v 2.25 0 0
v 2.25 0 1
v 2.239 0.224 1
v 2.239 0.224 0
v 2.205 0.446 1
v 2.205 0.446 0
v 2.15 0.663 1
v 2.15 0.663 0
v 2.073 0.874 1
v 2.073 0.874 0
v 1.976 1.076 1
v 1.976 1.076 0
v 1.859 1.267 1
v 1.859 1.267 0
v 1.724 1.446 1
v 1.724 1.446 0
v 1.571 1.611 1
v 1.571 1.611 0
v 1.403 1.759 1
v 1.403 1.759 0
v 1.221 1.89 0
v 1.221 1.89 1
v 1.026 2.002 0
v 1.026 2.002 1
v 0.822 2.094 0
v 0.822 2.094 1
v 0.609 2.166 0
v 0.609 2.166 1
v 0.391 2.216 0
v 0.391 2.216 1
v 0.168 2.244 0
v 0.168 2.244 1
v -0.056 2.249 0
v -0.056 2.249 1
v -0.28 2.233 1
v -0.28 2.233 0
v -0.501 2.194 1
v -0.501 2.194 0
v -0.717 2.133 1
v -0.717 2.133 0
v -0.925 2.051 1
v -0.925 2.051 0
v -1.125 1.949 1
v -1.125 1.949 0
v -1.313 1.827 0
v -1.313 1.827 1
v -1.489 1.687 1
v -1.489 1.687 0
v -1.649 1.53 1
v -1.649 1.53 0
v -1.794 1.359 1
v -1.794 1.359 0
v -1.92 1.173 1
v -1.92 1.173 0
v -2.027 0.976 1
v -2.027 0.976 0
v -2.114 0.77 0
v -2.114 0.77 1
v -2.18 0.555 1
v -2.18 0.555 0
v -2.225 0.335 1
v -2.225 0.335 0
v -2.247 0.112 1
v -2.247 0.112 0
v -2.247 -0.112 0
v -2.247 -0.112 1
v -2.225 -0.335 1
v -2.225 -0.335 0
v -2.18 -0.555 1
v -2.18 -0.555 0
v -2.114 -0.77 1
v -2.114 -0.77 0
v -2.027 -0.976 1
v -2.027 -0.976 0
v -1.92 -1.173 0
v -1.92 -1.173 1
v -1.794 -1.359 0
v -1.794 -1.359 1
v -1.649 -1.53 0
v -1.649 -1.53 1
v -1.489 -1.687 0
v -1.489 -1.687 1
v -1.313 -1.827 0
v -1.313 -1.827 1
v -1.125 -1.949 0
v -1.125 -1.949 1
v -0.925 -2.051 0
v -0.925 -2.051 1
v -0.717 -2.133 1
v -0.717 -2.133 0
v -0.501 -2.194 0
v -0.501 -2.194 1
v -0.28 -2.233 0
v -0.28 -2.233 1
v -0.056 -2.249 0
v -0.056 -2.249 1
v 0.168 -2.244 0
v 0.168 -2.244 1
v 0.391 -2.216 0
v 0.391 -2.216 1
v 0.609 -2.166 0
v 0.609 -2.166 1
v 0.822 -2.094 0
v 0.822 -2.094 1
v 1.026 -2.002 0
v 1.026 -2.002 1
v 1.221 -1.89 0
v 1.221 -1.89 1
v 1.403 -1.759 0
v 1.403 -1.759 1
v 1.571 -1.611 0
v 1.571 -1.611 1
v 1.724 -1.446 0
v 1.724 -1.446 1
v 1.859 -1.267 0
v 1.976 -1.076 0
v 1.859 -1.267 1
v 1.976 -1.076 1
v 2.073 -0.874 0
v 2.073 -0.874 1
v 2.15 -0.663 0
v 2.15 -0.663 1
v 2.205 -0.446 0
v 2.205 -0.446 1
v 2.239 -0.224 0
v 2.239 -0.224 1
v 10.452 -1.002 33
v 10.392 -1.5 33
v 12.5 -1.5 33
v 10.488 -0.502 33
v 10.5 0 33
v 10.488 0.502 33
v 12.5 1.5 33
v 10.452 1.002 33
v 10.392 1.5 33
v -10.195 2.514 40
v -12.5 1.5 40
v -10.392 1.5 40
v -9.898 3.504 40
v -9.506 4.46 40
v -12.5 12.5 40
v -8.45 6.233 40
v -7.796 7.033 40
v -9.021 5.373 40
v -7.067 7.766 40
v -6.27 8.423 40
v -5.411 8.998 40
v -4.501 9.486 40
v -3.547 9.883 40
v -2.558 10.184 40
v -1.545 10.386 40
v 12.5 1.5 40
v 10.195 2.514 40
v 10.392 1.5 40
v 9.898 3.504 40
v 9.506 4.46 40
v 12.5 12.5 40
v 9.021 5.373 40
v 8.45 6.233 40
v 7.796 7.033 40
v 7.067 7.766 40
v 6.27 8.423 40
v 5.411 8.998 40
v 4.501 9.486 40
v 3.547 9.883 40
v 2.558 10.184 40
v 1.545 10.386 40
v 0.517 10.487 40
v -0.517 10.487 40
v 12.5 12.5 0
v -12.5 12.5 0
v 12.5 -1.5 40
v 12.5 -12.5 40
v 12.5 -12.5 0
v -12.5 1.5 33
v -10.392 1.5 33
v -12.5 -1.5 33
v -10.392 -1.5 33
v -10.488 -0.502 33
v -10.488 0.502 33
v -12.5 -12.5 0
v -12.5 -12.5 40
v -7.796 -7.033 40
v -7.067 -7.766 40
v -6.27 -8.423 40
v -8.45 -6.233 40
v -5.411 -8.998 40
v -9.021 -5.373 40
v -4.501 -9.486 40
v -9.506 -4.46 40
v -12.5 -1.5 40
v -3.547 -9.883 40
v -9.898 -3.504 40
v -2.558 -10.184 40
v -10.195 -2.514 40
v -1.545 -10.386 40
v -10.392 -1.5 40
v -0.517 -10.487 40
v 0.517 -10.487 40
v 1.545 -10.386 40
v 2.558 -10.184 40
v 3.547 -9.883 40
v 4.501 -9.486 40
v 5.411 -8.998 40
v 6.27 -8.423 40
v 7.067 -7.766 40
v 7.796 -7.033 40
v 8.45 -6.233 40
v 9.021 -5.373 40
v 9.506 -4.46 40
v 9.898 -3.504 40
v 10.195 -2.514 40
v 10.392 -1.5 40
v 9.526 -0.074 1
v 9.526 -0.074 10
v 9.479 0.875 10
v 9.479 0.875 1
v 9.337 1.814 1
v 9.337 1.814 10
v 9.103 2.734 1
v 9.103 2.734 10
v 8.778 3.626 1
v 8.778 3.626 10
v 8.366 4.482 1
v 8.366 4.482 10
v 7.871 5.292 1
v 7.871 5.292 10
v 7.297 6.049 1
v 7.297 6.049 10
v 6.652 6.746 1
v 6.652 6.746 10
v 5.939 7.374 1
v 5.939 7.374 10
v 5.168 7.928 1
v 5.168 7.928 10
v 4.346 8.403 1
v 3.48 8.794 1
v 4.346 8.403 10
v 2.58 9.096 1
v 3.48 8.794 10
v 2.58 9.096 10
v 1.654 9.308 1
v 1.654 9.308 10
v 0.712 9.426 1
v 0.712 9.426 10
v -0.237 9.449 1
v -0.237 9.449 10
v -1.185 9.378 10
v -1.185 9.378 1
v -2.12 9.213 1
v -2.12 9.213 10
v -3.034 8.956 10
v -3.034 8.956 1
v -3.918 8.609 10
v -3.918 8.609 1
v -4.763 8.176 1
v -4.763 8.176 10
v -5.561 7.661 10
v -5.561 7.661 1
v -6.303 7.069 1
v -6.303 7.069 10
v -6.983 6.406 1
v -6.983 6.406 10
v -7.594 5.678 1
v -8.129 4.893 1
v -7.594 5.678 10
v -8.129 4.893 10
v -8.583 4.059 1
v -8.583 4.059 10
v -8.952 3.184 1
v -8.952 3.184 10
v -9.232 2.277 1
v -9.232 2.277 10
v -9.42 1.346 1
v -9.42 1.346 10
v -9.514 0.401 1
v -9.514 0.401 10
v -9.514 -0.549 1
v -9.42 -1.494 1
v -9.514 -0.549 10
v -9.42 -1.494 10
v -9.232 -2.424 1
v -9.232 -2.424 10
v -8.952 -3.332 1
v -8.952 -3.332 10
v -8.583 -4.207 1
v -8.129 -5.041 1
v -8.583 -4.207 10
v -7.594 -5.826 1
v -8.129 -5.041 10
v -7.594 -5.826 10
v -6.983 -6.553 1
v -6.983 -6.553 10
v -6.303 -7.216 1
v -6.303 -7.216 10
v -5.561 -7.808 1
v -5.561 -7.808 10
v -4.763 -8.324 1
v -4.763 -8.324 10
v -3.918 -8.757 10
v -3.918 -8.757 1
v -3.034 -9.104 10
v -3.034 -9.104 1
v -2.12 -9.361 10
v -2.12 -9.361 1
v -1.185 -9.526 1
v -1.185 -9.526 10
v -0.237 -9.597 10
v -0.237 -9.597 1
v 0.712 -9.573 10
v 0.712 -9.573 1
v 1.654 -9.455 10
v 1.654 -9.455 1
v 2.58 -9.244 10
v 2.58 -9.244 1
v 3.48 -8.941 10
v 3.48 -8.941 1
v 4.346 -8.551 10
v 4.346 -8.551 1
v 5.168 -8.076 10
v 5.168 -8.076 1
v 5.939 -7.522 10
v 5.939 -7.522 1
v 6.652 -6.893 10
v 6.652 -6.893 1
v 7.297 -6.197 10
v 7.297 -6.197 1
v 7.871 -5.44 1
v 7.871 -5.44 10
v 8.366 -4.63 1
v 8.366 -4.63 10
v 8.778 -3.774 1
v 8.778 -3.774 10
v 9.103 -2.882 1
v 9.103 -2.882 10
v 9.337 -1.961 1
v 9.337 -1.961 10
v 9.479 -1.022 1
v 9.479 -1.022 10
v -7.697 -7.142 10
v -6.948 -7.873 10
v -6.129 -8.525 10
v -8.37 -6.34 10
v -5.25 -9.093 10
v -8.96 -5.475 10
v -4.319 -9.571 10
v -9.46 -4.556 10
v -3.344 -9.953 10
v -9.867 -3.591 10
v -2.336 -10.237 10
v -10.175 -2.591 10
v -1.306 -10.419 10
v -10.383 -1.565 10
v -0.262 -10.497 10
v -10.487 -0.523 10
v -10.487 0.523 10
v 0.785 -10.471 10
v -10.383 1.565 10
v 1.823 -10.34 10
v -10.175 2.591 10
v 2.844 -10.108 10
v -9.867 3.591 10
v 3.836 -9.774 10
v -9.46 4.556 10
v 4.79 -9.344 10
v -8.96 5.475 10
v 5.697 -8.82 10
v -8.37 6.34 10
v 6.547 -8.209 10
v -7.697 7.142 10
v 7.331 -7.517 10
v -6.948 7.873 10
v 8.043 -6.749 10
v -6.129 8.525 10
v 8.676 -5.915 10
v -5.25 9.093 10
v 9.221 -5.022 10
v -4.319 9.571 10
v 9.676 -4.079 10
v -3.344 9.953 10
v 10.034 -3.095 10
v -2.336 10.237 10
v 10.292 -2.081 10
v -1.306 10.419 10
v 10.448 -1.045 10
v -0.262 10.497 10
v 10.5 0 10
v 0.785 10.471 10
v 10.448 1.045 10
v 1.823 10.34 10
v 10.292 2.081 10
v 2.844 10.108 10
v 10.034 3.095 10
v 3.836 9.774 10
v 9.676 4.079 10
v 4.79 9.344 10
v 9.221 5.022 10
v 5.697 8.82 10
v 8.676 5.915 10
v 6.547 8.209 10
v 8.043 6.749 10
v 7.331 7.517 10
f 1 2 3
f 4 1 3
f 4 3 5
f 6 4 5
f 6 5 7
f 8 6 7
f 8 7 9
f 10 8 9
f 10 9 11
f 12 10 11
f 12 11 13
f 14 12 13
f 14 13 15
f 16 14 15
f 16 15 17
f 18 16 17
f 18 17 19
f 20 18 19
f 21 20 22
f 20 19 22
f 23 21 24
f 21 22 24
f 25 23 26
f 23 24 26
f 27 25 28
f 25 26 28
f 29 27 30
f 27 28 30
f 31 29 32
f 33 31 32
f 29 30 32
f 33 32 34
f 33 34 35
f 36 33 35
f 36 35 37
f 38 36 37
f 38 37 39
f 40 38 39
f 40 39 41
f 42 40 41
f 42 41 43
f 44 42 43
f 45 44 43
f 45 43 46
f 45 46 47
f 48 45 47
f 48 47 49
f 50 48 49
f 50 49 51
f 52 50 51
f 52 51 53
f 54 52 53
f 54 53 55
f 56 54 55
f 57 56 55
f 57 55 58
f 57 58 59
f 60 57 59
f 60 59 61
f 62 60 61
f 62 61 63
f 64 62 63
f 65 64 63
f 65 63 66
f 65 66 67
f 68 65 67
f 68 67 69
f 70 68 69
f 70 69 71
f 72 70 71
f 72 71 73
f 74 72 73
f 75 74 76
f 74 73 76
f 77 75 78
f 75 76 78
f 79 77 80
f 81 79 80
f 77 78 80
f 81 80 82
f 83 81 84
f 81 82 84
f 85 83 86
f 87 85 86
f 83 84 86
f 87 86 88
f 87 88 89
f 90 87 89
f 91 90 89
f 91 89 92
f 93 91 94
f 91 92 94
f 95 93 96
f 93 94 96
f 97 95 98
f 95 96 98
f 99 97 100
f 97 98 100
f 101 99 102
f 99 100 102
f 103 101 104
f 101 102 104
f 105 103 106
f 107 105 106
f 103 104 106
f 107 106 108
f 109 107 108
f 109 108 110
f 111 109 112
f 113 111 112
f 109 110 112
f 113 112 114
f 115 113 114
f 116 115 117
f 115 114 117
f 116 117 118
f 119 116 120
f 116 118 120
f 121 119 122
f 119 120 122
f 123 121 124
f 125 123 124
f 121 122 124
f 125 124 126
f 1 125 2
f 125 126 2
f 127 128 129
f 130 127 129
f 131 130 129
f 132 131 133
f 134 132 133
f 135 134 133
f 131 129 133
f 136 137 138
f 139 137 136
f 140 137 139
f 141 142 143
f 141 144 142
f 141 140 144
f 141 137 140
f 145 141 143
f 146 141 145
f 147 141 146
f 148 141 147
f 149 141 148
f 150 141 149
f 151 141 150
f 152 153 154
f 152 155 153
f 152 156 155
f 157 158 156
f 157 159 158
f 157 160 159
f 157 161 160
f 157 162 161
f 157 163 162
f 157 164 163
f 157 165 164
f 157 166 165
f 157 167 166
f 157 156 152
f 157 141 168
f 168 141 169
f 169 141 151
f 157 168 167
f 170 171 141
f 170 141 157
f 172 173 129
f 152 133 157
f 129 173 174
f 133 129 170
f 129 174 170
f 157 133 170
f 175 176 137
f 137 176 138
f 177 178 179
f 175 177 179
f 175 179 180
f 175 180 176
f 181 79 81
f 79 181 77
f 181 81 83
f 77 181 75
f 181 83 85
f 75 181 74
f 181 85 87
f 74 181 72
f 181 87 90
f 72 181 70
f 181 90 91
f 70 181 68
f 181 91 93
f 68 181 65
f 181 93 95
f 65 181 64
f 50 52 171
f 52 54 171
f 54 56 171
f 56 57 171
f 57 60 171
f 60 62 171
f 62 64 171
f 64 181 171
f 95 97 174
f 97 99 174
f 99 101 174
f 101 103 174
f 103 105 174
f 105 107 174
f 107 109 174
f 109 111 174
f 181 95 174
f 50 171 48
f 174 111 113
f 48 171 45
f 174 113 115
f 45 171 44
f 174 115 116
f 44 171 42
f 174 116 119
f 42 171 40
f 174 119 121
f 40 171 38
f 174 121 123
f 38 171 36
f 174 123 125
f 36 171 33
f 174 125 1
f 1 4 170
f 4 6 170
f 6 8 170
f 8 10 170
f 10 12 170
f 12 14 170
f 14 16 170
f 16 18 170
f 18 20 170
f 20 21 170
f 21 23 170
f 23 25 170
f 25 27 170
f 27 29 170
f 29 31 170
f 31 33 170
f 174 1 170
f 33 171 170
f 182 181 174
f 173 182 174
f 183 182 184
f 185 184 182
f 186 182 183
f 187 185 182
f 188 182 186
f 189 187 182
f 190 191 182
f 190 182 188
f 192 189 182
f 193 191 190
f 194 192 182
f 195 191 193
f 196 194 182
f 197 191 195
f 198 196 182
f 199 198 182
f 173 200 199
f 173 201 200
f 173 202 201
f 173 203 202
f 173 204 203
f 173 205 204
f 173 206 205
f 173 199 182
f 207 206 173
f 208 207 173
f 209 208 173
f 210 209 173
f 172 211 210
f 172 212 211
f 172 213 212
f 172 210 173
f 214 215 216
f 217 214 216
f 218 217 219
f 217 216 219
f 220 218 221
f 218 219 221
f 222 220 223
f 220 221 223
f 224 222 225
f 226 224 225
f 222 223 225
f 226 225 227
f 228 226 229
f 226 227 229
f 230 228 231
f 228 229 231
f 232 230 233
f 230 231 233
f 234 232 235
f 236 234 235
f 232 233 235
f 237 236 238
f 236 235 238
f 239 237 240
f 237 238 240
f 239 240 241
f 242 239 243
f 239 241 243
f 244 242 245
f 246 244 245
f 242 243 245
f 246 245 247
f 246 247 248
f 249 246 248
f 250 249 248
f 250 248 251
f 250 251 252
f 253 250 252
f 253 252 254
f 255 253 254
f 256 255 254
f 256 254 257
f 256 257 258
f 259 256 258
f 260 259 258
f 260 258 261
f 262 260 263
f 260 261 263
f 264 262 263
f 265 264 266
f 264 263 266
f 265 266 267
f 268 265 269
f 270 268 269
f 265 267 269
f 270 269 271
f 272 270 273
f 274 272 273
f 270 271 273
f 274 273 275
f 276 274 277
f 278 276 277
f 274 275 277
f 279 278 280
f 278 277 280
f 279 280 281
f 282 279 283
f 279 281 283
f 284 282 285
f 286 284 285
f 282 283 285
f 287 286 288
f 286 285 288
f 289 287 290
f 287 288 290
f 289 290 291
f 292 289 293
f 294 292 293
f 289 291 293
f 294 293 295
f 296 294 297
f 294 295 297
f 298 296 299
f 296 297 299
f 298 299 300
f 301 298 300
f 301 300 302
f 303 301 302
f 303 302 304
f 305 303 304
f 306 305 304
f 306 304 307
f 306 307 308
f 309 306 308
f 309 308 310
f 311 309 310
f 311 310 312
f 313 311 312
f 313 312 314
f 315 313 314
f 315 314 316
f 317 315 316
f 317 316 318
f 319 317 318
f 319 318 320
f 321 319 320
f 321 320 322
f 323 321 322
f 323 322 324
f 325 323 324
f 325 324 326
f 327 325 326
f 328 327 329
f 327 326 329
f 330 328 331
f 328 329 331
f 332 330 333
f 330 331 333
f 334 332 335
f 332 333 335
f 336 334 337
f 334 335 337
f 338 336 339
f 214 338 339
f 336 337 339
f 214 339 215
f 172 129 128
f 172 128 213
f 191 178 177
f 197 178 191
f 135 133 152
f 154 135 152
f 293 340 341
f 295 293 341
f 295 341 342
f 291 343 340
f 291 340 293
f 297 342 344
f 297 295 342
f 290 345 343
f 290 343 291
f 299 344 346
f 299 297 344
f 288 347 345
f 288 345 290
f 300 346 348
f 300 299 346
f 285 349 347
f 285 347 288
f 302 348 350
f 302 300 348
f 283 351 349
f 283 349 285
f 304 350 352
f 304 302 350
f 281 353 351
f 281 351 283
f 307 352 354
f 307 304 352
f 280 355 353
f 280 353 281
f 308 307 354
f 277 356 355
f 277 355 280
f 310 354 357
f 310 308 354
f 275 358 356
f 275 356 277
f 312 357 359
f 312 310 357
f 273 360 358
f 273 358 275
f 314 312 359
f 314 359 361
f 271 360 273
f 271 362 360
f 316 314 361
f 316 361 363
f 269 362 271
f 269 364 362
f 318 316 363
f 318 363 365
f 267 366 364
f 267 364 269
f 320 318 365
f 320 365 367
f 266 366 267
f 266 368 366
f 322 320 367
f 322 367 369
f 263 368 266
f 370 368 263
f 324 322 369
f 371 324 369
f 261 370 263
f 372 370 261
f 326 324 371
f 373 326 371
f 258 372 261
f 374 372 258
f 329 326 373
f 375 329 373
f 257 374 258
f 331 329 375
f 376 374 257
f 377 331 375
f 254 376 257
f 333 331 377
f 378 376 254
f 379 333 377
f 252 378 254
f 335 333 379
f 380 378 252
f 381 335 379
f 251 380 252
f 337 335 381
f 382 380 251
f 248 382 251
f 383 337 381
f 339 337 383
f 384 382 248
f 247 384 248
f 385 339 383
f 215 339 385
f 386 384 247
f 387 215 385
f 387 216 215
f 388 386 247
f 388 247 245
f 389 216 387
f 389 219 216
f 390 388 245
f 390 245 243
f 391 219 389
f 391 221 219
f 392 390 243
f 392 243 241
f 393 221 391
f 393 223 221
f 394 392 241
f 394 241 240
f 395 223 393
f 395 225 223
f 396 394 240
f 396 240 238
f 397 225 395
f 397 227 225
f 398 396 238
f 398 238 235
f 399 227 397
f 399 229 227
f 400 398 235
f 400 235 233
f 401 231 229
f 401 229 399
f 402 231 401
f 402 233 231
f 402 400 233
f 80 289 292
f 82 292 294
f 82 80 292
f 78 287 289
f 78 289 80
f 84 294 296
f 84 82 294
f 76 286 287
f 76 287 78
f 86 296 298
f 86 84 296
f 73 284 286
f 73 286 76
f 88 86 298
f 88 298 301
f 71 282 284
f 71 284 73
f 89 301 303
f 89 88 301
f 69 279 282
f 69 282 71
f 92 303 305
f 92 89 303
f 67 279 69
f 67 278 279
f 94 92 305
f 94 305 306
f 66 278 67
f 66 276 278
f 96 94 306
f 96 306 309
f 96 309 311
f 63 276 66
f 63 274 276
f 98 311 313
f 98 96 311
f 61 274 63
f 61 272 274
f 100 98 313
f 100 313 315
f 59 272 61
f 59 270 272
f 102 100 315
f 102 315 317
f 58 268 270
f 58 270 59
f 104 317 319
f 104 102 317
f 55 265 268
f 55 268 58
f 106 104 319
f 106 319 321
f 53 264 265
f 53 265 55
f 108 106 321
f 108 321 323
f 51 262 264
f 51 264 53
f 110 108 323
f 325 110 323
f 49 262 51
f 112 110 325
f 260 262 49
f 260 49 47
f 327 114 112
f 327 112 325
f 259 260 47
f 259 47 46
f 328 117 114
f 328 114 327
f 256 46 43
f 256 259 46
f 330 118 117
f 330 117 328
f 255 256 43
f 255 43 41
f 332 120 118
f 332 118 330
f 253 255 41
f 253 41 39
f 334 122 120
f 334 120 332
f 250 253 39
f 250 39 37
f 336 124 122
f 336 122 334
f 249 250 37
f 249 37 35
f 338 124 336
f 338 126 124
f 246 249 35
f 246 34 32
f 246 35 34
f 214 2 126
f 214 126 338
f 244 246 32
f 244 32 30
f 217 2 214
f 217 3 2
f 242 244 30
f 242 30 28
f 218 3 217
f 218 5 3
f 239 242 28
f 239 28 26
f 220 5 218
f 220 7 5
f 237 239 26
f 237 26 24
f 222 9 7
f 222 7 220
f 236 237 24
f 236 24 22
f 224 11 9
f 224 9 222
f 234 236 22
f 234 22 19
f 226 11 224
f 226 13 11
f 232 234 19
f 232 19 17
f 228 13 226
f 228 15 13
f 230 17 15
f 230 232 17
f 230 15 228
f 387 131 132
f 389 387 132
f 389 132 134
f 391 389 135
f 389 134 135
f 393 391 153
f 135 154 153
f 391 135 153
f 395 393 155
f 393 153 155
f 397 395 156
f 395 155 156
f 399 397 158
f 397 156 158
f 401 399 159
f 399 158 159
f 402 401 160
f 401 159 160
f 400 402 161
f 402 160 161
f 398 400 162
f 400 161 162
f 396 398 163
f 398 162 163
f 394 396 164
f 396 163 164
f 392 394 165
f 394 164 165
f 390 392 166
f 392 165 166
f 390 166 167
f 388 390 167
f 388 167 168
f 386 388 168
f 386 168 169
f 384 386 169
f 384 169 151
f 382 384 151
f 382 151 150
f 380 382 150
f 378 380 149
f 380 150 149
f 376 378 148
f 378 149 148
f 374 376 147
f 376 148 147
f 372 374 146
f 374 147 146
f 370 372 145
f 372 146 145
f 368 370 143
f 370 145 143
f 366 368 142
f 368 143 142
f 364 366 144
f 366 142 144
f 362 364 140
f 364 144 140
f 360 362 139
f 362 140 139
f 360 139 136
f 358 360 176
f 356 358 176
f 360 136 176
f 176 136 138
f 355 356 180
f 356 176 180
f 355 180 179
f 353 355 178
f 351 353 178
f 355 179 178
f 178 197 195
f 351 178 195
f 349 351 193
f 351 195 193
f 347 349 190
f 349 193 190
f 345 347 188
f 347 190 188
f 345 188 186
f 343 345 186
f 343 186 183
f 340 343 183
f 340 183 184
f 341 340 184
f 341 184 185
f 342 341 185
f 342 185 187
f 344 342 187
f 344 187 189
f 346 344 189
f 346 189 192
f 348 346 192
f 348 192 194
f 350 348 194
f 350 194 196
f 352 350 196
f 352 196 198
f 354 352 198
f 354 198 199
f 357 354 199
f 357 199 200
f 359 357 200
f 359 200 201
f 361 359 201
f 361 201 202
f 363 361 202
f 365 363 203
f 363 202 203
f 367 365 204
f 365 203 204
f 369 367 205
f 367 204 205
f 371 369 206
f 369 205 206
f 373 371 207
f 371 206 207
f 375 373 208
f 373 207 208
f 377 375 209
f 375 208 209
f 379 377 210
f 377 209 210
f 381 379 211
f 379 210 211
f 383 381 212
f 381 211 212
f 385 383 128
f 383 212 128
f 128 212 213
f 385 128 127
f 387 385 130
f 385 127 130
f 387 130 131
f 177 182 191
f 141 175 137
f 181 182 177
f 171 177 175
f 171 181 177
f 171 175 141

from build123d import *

# Parameters (mm, degrees)
F0_W     = 25
F0_H     = 25
F1_DEPTH = 40
F2_R     = 10.5
F3_DEPTH = 30
F4_R     = 2.25
F5_DEPTH = 25
F6_W     = 3
F6_H     = 7
F7_DEPTH = 25
F8_R     = 9.526155
F9_DEPTH = 9


with BuildPart() as f1:
    # F0 (on Top) → F1 (new body)
    with BuildSketch(Plane.XY):
        Rectangle(F0_W, F0_H)
    extrude(amount=F1_DEPTH)

    # F2 (on face) → F3 (cut)
    with BuildSketch(Plane.XY.offset(40)):
        Circle(F2_R)
    extrude(amount=-F3_DEPTH, mode=Mode.SUBTRACT)

    # F4 (on face) → F5 (cut)
    with BuildSketch(Plane.XY.offset(10)):
        Circle(F4_R)
    extrude(amount=-F5_DEPTH, mode=Mode.SUBTRACT)

    # F6 (on face) → F7 (cut)
    with BuildSketch(Plane.YZ.offset(12.5)):
        with Locations((0, 36.5)):
            Rectangle(F6_W, F6_H)
    extrude(amount=-F7_DEPTH, mode=Mode.SUBTRACT)

    # F8 (on face) → F9 (cut)
    with BuildSketch(Plane.XY.offset(10)):
        with Locations((0, -0.073845)):
            Circle(F8_R)
    extrude(amount=-F9_DEPTH, mode=Mode.SUBTRACT)


solid = f1.part
